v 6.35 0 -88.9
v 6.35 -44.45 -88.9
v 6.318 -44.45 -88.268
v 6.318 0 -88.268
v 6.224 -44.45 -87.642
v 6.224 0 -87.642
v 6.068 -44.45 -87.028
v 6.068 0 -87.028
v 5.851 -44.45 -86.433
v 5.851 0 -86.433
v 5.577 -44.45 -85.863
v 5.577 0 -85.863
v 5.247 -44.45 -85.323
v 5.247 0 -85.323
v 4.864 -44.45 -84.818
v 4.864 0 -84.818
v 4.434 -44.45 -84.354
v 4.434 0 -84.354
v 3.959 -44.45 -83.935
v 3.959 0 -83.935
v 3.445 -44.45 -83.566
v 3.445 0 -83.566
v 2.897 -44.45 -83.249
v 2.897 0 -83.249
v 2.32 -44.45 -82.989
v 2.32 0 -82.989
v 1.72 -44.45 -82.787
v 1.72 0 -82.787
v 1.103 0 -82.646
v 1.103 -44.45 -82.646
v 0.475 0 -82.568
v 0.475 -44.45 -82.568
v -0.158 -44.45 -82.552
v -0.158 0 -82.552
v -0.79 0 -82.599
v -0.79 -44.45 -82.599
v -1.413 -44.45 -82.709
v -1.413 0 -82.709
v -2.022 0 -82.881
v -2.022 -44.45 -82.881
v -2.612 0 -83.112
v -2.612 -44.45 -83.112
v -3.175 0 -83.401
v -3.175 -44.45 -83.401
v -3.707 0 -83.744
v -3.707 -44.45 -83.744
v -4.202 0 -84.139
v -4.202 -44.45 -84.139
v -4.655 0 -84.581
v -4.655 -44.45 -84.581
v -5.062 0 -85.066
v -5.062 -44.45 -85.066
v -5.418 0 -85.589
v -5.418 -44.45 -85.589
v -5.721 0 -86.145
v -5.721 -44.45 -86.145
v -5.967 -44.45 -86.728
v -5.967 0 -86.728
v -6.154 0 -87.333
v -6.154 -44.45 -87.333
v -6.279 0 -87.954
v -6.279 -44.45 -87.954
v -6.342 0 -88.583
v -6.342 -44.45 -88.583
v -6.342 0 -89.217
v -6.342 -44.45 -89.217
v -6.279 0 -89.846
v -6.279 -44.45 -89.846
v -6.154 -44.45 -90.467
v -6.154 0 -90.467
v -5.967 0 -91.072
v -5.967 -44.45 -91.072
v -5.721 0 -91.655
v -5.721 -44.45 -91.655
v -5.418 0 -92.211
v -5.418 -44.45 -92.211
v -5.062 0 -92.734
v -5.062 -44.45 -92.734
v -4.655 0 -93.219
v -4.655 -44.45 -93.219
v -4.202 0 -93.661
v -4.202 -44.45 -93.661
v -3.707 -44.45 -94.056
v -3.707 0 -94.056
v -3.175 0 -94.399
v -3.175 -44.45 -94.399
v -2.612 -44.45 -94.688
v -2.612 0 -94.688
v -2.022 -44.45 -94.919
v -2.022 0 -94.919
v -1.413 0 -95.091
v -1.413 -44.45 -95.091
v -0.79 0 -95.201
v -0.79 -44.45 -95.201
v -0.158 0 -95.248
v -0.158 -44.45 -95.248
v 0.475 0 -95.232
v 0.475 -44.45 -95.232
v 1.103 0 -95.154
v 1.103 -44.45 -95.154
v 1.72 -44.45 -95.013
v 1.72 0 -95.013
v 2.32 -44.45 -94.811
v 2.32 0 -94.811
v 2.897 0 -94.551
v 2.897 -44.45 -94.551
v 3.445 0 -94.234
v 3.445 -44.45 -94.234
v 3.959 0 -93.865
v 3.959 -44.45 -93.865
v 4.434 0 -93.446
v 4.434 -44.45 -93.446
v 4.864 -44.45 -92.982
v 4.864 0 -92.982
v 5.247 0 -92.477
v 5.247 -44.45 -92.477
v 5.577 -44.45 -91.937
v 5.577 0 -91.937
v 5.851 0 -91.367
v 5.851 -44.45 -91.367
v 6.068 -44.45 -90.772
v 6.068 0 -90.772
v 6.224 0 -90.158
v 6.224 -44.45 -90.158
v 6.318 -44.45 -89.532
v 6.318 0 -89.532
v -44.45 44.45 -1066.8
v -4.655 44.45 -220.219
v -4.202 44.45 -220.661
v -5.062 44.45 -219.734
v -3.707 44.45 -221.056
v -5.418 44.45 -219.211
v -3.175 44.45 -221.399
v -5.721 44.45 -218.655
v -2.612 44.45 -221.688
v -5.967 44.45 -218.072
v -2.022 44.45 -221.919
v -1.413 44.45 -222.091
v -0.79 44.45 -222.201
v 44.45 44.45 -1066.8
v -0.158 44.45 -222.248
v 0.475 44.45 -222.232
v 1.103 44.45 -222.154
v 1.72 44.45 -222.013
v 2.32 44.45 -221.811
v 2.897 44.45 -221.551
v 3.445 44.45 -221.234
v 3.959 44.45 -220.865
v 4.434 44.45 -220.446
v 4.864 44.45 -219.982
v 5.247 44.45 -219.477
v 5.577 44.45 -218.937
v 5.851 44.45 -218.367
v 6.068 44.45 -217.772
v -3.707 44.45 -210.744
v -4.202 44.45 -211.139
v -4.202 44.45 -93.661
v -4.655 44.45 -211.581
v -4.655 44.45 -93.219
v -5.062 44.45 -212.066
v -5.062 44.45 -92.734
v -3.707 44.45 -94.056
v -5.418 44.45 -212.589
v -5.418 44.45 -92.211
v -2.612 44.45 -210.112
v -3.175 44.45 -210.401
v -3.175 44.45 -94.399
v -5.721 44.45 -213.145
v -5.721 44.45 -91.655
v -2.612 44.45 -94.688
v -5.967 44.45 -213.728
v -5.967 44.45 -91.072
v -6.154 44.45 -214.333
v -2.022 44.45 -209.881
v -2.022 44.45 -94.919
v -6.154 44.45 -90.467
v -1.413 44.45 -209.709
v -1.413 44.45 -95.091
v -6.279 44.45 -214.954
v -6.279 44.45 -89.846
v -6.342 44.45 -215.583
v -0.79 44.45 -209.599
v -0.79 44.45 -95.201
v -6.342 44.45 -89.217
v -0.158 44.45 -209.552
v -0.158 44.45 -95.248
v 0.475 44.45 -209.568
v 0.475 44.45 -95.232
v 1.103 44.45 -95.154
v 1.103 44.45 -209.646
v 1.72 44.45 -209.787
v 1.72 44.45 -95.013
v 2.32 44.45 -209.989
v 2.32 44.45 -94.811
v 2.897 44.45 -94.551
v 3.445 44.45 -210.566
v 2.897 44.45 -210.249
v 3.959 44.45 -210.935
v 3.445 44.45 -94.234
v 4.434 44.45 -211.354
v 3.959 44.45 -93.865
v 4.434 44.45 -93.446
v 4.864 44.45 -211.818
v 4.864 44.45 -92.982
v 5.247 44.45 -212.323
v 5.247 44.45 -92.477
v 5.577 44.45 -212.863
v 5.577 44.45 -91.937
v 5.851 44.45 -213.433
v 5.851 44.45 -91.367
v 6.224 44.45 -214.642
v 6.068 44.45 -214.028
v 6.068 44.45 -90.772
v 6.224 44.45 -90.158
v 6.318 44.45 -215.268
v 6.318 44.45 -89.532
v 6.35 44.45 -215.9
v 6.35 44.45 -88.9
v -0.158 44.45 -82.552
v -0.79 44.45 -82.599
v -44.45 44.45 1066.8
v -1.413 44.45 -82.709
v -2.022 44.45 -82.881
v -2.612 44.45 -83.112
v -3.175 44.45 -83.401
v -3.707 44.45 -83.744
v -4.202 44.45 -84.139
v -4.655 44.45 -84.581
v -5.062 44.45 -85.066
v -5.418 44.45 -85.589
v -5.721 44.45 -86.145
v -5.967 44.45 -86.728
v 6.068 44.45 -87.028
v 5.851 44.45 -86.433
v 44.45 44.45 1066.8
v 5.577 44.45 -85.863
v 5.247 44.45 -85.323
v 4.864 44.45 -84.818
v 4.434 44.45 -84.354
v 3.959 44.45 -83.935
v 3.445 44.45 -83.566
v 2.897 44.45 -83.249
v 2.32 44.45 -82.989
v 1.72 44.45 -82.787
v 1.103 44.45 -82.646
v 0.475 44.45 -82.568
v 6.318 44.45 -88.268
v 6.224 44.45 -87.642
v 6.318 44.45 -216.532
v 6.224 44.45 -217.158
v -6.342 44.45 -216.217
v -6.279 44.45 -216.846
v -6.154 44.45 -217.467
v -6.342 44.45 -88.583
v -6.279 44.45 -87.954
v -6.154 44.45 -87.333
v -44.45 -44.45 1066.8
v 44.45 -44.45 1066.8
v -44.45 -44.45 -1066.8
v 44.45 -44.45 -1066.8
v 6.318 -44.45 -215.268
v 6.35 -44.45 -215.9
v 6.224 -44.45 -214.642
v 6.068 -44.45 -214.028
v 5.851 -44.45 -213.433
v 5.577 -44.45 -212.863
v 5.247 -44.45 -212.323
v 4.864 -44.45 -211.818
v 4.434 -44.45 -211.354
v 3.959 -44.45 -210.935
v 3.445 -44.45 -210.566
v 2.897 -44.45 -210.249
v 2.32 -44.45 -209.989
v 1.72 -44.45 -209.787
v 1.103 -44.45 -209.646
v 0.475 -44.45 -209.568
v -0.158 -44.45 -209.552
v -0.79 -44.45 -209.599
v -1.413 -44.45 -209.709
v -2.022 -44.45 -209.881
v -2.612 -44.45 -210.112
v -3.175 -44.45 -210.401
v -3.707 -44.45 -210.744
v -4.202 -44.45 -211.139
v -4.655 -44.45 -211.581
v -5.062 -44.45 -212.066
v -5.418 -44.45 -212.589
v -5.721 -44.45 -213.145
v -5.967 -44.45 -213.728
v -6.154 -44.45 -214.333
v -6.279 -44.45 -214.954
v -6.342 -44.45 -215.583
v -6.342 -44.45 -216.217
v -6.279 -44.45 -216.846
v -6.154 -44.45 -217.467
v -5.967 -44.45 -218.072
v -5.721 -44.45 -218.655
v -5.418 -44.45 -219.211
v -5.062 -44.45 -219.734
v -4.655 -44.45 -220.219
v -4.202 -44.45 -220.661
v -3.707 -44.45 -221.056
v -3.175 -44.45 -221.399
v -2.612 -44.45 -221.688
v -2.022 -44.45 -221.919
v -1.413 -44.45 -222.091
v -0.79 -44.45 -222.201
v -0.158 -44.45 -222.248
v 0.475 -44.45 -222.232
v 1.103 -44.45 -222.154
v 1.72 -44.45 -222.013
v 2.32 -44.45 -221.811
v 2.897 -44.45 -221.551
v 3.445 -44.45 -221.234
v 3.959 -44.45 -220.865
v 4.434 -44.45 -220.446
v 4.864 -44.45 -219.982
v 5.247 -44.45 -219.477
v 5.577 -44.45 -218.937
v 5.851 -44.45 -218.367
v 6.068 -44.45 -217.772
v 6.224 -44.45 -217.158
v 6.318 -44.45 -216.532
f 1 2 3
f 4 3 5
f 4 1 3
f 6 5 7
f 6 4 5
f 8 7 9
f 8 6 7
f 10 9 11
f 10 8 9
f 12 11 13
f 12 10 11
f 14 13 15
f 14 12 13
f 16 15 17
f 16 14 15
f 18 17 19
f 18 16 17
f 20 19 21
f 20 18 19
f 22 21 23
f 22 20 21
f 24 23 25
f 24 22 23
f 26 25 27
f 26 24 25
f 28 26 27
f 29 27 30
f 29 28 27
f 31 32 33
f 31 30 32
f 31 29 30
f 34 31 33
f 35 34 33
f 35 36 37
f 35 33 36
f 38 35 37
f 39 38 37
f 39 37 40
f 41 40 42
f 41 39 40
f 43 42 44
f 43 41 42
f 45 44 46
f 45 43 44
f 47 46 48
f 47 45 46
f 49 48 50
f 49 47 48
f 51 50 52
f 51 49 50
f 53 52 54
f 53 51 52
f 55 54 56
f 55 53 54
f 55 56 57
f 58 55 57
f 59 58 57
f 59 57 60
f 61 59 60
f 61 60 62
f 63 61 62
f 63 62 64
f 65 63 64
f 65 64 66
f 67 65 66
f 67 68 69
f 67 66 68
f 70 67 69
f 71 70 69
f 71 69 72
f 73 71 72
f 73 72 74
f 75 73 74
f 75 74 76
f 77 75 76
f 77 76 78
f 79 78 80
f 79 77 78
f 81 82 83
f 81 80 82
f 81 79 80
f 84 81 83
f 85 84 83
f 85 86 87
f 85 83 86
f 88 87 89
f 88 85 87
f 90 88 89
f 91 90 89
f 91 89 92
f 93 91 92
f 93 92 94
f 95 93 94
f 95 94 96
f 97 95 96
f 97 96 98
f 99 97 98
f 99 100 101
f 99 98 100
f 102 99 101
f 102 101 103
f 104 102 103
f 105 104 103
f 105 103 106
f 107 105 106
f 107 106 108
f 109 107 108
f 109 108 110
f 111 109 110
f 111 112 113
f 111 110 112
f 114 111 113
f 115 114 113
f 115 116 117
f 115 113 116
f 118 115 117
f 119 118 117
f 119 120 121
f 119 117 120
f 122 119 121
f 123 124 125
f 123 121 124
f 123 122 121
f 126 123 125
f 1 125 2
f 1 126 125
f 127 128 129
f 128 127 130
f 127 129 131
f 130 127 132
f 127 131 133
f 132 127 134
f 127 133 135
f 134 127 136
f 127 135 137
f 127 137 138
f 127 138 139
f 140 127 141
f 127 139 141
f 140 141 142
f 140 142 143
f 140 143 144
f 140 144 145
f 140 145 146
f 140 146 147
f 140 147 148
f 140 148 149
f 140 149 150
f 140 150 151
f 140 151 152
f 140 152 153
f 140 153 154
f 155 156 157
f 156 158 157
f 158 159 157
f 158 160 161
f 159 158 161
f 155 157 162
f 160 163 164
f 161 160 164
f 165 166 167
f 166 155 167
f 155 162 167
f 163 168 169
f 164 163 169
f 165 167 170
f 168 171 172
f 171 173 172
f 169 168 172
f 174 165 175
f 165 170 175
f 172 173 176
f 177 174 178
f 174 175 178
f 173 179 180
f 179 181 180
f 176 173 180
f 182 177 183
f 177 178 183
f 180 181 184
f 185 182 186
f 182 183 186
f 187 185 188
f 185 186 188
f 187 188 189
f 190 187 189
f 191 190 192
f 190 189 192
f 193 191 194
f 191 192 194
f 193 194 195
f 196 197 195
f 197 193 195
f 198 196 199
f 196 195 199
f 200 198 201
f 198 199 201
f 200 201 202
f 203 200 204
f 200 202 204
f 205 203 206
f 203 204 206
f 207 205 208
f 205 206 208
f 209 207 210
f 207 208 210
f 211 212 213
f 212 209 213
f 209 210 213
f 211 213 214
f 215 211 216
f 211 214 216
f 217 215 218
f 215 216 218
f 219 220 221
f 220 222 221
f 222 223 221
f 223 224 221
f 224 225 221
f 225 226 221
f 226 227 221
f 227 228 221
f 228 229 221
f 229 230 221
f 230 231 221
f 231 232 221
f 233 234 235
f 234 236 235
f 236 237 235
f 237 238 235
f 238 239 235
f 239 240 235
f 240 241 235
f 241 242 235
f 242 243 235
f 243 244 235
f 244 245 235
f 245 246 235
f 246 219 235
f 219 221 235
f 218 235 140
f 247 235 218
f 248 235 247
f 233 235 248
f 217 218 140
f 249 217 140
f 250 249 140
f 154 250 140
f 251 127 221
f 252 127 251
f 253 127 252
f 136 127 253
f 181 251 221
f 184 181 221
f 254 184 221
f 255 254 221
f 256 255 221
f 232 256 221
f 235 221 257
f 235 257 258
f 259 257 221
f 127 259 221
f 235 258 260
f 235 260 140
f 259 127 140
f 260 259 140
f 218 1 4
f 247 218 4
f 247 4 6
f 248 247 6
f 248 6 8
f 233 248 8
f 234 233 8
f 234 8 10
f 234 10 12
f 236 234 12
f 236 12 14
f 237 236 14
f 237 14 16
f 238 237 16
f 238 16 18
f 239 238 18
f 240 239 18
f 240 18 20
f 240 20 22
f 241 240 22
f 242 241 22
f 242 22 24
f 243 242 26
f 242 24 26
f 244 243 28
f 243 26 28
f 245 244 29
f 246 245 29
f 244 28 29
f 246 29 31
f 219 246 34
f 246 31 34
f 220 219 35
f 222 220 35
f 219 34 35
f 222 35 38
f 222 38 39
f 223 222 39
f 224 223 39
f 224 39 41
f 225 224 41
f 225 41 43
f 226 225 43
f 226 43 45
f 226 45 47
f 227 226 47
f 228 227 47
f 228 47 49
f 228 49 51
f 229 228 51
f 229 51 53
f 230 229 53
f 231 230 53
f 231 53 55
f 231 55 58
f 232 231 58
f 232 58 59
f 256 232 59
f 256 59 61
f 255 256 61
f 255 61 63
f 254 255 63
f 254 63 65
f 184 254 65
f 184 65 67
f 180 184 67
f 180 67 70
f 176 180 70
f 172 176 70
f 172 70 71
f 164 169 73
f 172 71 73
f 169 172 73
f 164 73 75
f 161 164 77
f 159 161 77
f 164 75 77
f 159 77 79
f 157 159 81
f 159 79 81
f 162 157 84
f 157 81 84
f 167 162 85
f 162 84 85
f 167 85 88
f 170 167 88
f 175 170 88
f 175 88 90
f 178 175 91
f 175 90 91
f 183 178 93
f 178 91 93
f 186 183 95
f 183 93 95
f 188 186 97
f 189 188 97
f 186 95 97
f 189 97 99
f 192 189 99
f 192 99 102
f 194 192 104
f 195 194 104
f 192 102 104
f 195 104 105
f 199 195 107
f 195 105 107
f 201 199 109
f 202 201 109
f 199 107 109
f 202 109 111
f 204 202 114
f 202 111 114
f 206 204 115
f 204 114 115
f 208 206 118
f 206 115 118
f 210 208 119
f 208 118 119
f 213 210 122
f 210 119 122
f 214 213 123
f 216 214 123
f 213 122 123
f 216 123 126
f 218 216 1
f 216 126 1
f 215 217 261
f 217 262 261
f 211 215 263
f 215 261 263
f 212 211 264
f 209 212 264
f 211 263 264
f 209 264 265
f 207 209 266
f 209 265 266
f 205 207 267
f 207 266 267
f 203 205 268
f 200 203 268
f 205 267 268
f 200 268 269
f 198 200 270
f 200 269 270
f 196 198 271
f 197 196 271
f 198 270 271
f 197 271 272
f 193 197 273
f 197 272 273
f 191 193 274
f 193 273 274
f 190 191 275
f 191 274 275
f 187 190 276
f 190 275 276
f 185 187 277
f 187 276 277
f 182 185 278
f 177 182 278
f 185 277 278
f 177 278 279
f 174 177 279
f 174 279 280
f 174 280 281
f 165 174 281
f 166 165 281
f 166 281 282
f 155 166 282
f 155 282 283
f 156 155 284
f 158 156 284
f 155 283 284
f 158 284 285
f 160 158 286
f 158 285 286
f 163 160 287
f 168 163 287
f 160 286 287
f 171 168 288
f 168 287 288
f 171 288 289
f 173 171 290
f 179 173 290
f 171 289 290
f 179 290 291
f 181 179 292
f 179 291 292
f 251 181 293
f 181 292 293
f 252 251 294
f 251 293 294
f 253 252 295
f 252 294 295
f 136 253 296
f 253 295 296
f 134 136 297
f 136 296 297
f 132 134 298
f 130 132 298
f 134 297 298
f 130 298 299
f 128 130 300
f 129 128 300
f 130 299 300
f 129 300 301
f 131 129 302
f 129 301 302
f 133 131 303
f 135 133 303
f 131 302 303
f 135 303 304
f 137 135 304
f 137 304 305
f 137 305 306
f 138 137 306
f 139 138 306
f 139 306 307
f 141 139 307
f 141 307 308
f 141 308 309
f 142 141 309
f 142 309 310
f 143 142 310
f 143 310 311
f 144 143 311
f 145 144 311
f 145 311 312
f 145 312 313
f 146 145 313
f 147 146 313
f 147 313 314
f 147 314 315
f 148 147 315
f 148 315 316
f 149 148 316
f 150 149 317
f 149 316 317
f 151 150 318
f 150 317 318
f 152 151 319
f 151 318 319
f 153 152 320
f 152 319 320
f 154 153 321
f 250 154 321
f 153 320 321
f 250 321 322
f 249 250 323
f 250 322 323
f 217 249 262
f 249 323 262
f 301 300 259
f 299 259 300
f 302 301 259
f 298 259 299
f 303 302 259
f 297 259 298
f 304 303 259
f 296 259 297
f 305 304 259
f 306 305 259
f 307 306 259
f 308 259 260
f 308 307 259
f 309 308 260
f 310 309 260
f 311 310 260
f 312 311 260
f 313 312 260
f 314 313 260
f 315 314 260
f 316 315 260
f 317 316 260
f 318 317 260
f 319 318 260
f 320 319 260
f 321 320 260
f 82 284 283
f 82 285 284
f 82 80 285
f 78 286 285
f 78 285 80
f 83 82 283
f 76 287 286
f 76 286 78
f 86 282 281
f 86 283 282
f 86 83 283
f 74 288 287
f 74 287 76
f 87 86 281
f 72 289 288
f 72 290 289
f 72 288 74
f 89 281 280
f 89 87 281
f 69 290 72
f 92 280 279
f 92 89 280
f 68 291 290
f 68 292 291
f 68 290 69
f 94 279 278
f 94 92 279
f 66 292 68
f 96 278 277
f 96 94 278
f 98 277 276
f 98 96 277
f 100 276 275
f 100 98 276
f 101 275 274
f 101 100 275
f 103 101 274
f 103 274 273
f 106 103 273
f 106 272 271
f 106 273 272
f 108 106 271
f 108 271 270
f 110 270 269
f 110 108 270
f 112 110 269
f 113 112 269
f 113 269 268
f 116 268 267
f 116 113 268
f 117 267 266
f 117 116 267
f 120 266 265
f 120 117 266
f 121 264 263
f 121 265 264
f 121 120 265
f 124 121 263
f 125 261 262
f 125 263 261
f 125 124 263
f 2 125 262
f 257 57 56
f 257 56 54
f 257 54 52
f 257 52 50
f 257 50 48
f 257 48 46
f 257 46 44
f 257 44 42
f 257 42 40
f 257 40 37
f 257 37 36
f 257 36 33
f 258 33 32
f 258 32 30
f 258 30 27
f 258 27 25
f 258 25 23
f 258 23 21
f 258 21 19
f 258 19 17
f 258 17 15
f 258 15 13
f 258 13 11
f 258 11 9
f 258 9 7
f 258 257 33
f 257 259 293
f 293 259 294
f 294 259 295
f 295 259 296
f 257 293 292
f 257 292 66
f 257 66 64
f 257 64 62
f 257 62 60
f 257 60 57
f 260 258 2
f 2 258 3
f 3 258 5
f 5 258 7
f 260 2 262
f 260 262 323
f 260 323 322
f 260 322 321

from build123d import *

# Parameters (mm, degrees)
F0_W     = 88.9
F0_H     = 88.9
F1_DEPTH = 1066.8
F2_R     = 6.35
F3_DEPTH = 50.8


with BuildPart() as f1:
    # F0 (on Top) → F1 (new body, symmetric)
    with BuildSketch(Plane.XY):
        Rectangle(F0_W, F0_H)
    extrude(amount=F1_DEPTH, both=True)

    # F2 (on Front) → F3 (cut, symmetric)
    with BuildSketch(Plane.XZ):
        with Locations((0, -88.9)):
            Circle(F2_R)
        with Locations((0, -215.9)):
            Circle(F2_R)
    extrude(amount=F3_DEPTH, both=True, mode=Mode.SUBTRACT)


solid = f1.part
